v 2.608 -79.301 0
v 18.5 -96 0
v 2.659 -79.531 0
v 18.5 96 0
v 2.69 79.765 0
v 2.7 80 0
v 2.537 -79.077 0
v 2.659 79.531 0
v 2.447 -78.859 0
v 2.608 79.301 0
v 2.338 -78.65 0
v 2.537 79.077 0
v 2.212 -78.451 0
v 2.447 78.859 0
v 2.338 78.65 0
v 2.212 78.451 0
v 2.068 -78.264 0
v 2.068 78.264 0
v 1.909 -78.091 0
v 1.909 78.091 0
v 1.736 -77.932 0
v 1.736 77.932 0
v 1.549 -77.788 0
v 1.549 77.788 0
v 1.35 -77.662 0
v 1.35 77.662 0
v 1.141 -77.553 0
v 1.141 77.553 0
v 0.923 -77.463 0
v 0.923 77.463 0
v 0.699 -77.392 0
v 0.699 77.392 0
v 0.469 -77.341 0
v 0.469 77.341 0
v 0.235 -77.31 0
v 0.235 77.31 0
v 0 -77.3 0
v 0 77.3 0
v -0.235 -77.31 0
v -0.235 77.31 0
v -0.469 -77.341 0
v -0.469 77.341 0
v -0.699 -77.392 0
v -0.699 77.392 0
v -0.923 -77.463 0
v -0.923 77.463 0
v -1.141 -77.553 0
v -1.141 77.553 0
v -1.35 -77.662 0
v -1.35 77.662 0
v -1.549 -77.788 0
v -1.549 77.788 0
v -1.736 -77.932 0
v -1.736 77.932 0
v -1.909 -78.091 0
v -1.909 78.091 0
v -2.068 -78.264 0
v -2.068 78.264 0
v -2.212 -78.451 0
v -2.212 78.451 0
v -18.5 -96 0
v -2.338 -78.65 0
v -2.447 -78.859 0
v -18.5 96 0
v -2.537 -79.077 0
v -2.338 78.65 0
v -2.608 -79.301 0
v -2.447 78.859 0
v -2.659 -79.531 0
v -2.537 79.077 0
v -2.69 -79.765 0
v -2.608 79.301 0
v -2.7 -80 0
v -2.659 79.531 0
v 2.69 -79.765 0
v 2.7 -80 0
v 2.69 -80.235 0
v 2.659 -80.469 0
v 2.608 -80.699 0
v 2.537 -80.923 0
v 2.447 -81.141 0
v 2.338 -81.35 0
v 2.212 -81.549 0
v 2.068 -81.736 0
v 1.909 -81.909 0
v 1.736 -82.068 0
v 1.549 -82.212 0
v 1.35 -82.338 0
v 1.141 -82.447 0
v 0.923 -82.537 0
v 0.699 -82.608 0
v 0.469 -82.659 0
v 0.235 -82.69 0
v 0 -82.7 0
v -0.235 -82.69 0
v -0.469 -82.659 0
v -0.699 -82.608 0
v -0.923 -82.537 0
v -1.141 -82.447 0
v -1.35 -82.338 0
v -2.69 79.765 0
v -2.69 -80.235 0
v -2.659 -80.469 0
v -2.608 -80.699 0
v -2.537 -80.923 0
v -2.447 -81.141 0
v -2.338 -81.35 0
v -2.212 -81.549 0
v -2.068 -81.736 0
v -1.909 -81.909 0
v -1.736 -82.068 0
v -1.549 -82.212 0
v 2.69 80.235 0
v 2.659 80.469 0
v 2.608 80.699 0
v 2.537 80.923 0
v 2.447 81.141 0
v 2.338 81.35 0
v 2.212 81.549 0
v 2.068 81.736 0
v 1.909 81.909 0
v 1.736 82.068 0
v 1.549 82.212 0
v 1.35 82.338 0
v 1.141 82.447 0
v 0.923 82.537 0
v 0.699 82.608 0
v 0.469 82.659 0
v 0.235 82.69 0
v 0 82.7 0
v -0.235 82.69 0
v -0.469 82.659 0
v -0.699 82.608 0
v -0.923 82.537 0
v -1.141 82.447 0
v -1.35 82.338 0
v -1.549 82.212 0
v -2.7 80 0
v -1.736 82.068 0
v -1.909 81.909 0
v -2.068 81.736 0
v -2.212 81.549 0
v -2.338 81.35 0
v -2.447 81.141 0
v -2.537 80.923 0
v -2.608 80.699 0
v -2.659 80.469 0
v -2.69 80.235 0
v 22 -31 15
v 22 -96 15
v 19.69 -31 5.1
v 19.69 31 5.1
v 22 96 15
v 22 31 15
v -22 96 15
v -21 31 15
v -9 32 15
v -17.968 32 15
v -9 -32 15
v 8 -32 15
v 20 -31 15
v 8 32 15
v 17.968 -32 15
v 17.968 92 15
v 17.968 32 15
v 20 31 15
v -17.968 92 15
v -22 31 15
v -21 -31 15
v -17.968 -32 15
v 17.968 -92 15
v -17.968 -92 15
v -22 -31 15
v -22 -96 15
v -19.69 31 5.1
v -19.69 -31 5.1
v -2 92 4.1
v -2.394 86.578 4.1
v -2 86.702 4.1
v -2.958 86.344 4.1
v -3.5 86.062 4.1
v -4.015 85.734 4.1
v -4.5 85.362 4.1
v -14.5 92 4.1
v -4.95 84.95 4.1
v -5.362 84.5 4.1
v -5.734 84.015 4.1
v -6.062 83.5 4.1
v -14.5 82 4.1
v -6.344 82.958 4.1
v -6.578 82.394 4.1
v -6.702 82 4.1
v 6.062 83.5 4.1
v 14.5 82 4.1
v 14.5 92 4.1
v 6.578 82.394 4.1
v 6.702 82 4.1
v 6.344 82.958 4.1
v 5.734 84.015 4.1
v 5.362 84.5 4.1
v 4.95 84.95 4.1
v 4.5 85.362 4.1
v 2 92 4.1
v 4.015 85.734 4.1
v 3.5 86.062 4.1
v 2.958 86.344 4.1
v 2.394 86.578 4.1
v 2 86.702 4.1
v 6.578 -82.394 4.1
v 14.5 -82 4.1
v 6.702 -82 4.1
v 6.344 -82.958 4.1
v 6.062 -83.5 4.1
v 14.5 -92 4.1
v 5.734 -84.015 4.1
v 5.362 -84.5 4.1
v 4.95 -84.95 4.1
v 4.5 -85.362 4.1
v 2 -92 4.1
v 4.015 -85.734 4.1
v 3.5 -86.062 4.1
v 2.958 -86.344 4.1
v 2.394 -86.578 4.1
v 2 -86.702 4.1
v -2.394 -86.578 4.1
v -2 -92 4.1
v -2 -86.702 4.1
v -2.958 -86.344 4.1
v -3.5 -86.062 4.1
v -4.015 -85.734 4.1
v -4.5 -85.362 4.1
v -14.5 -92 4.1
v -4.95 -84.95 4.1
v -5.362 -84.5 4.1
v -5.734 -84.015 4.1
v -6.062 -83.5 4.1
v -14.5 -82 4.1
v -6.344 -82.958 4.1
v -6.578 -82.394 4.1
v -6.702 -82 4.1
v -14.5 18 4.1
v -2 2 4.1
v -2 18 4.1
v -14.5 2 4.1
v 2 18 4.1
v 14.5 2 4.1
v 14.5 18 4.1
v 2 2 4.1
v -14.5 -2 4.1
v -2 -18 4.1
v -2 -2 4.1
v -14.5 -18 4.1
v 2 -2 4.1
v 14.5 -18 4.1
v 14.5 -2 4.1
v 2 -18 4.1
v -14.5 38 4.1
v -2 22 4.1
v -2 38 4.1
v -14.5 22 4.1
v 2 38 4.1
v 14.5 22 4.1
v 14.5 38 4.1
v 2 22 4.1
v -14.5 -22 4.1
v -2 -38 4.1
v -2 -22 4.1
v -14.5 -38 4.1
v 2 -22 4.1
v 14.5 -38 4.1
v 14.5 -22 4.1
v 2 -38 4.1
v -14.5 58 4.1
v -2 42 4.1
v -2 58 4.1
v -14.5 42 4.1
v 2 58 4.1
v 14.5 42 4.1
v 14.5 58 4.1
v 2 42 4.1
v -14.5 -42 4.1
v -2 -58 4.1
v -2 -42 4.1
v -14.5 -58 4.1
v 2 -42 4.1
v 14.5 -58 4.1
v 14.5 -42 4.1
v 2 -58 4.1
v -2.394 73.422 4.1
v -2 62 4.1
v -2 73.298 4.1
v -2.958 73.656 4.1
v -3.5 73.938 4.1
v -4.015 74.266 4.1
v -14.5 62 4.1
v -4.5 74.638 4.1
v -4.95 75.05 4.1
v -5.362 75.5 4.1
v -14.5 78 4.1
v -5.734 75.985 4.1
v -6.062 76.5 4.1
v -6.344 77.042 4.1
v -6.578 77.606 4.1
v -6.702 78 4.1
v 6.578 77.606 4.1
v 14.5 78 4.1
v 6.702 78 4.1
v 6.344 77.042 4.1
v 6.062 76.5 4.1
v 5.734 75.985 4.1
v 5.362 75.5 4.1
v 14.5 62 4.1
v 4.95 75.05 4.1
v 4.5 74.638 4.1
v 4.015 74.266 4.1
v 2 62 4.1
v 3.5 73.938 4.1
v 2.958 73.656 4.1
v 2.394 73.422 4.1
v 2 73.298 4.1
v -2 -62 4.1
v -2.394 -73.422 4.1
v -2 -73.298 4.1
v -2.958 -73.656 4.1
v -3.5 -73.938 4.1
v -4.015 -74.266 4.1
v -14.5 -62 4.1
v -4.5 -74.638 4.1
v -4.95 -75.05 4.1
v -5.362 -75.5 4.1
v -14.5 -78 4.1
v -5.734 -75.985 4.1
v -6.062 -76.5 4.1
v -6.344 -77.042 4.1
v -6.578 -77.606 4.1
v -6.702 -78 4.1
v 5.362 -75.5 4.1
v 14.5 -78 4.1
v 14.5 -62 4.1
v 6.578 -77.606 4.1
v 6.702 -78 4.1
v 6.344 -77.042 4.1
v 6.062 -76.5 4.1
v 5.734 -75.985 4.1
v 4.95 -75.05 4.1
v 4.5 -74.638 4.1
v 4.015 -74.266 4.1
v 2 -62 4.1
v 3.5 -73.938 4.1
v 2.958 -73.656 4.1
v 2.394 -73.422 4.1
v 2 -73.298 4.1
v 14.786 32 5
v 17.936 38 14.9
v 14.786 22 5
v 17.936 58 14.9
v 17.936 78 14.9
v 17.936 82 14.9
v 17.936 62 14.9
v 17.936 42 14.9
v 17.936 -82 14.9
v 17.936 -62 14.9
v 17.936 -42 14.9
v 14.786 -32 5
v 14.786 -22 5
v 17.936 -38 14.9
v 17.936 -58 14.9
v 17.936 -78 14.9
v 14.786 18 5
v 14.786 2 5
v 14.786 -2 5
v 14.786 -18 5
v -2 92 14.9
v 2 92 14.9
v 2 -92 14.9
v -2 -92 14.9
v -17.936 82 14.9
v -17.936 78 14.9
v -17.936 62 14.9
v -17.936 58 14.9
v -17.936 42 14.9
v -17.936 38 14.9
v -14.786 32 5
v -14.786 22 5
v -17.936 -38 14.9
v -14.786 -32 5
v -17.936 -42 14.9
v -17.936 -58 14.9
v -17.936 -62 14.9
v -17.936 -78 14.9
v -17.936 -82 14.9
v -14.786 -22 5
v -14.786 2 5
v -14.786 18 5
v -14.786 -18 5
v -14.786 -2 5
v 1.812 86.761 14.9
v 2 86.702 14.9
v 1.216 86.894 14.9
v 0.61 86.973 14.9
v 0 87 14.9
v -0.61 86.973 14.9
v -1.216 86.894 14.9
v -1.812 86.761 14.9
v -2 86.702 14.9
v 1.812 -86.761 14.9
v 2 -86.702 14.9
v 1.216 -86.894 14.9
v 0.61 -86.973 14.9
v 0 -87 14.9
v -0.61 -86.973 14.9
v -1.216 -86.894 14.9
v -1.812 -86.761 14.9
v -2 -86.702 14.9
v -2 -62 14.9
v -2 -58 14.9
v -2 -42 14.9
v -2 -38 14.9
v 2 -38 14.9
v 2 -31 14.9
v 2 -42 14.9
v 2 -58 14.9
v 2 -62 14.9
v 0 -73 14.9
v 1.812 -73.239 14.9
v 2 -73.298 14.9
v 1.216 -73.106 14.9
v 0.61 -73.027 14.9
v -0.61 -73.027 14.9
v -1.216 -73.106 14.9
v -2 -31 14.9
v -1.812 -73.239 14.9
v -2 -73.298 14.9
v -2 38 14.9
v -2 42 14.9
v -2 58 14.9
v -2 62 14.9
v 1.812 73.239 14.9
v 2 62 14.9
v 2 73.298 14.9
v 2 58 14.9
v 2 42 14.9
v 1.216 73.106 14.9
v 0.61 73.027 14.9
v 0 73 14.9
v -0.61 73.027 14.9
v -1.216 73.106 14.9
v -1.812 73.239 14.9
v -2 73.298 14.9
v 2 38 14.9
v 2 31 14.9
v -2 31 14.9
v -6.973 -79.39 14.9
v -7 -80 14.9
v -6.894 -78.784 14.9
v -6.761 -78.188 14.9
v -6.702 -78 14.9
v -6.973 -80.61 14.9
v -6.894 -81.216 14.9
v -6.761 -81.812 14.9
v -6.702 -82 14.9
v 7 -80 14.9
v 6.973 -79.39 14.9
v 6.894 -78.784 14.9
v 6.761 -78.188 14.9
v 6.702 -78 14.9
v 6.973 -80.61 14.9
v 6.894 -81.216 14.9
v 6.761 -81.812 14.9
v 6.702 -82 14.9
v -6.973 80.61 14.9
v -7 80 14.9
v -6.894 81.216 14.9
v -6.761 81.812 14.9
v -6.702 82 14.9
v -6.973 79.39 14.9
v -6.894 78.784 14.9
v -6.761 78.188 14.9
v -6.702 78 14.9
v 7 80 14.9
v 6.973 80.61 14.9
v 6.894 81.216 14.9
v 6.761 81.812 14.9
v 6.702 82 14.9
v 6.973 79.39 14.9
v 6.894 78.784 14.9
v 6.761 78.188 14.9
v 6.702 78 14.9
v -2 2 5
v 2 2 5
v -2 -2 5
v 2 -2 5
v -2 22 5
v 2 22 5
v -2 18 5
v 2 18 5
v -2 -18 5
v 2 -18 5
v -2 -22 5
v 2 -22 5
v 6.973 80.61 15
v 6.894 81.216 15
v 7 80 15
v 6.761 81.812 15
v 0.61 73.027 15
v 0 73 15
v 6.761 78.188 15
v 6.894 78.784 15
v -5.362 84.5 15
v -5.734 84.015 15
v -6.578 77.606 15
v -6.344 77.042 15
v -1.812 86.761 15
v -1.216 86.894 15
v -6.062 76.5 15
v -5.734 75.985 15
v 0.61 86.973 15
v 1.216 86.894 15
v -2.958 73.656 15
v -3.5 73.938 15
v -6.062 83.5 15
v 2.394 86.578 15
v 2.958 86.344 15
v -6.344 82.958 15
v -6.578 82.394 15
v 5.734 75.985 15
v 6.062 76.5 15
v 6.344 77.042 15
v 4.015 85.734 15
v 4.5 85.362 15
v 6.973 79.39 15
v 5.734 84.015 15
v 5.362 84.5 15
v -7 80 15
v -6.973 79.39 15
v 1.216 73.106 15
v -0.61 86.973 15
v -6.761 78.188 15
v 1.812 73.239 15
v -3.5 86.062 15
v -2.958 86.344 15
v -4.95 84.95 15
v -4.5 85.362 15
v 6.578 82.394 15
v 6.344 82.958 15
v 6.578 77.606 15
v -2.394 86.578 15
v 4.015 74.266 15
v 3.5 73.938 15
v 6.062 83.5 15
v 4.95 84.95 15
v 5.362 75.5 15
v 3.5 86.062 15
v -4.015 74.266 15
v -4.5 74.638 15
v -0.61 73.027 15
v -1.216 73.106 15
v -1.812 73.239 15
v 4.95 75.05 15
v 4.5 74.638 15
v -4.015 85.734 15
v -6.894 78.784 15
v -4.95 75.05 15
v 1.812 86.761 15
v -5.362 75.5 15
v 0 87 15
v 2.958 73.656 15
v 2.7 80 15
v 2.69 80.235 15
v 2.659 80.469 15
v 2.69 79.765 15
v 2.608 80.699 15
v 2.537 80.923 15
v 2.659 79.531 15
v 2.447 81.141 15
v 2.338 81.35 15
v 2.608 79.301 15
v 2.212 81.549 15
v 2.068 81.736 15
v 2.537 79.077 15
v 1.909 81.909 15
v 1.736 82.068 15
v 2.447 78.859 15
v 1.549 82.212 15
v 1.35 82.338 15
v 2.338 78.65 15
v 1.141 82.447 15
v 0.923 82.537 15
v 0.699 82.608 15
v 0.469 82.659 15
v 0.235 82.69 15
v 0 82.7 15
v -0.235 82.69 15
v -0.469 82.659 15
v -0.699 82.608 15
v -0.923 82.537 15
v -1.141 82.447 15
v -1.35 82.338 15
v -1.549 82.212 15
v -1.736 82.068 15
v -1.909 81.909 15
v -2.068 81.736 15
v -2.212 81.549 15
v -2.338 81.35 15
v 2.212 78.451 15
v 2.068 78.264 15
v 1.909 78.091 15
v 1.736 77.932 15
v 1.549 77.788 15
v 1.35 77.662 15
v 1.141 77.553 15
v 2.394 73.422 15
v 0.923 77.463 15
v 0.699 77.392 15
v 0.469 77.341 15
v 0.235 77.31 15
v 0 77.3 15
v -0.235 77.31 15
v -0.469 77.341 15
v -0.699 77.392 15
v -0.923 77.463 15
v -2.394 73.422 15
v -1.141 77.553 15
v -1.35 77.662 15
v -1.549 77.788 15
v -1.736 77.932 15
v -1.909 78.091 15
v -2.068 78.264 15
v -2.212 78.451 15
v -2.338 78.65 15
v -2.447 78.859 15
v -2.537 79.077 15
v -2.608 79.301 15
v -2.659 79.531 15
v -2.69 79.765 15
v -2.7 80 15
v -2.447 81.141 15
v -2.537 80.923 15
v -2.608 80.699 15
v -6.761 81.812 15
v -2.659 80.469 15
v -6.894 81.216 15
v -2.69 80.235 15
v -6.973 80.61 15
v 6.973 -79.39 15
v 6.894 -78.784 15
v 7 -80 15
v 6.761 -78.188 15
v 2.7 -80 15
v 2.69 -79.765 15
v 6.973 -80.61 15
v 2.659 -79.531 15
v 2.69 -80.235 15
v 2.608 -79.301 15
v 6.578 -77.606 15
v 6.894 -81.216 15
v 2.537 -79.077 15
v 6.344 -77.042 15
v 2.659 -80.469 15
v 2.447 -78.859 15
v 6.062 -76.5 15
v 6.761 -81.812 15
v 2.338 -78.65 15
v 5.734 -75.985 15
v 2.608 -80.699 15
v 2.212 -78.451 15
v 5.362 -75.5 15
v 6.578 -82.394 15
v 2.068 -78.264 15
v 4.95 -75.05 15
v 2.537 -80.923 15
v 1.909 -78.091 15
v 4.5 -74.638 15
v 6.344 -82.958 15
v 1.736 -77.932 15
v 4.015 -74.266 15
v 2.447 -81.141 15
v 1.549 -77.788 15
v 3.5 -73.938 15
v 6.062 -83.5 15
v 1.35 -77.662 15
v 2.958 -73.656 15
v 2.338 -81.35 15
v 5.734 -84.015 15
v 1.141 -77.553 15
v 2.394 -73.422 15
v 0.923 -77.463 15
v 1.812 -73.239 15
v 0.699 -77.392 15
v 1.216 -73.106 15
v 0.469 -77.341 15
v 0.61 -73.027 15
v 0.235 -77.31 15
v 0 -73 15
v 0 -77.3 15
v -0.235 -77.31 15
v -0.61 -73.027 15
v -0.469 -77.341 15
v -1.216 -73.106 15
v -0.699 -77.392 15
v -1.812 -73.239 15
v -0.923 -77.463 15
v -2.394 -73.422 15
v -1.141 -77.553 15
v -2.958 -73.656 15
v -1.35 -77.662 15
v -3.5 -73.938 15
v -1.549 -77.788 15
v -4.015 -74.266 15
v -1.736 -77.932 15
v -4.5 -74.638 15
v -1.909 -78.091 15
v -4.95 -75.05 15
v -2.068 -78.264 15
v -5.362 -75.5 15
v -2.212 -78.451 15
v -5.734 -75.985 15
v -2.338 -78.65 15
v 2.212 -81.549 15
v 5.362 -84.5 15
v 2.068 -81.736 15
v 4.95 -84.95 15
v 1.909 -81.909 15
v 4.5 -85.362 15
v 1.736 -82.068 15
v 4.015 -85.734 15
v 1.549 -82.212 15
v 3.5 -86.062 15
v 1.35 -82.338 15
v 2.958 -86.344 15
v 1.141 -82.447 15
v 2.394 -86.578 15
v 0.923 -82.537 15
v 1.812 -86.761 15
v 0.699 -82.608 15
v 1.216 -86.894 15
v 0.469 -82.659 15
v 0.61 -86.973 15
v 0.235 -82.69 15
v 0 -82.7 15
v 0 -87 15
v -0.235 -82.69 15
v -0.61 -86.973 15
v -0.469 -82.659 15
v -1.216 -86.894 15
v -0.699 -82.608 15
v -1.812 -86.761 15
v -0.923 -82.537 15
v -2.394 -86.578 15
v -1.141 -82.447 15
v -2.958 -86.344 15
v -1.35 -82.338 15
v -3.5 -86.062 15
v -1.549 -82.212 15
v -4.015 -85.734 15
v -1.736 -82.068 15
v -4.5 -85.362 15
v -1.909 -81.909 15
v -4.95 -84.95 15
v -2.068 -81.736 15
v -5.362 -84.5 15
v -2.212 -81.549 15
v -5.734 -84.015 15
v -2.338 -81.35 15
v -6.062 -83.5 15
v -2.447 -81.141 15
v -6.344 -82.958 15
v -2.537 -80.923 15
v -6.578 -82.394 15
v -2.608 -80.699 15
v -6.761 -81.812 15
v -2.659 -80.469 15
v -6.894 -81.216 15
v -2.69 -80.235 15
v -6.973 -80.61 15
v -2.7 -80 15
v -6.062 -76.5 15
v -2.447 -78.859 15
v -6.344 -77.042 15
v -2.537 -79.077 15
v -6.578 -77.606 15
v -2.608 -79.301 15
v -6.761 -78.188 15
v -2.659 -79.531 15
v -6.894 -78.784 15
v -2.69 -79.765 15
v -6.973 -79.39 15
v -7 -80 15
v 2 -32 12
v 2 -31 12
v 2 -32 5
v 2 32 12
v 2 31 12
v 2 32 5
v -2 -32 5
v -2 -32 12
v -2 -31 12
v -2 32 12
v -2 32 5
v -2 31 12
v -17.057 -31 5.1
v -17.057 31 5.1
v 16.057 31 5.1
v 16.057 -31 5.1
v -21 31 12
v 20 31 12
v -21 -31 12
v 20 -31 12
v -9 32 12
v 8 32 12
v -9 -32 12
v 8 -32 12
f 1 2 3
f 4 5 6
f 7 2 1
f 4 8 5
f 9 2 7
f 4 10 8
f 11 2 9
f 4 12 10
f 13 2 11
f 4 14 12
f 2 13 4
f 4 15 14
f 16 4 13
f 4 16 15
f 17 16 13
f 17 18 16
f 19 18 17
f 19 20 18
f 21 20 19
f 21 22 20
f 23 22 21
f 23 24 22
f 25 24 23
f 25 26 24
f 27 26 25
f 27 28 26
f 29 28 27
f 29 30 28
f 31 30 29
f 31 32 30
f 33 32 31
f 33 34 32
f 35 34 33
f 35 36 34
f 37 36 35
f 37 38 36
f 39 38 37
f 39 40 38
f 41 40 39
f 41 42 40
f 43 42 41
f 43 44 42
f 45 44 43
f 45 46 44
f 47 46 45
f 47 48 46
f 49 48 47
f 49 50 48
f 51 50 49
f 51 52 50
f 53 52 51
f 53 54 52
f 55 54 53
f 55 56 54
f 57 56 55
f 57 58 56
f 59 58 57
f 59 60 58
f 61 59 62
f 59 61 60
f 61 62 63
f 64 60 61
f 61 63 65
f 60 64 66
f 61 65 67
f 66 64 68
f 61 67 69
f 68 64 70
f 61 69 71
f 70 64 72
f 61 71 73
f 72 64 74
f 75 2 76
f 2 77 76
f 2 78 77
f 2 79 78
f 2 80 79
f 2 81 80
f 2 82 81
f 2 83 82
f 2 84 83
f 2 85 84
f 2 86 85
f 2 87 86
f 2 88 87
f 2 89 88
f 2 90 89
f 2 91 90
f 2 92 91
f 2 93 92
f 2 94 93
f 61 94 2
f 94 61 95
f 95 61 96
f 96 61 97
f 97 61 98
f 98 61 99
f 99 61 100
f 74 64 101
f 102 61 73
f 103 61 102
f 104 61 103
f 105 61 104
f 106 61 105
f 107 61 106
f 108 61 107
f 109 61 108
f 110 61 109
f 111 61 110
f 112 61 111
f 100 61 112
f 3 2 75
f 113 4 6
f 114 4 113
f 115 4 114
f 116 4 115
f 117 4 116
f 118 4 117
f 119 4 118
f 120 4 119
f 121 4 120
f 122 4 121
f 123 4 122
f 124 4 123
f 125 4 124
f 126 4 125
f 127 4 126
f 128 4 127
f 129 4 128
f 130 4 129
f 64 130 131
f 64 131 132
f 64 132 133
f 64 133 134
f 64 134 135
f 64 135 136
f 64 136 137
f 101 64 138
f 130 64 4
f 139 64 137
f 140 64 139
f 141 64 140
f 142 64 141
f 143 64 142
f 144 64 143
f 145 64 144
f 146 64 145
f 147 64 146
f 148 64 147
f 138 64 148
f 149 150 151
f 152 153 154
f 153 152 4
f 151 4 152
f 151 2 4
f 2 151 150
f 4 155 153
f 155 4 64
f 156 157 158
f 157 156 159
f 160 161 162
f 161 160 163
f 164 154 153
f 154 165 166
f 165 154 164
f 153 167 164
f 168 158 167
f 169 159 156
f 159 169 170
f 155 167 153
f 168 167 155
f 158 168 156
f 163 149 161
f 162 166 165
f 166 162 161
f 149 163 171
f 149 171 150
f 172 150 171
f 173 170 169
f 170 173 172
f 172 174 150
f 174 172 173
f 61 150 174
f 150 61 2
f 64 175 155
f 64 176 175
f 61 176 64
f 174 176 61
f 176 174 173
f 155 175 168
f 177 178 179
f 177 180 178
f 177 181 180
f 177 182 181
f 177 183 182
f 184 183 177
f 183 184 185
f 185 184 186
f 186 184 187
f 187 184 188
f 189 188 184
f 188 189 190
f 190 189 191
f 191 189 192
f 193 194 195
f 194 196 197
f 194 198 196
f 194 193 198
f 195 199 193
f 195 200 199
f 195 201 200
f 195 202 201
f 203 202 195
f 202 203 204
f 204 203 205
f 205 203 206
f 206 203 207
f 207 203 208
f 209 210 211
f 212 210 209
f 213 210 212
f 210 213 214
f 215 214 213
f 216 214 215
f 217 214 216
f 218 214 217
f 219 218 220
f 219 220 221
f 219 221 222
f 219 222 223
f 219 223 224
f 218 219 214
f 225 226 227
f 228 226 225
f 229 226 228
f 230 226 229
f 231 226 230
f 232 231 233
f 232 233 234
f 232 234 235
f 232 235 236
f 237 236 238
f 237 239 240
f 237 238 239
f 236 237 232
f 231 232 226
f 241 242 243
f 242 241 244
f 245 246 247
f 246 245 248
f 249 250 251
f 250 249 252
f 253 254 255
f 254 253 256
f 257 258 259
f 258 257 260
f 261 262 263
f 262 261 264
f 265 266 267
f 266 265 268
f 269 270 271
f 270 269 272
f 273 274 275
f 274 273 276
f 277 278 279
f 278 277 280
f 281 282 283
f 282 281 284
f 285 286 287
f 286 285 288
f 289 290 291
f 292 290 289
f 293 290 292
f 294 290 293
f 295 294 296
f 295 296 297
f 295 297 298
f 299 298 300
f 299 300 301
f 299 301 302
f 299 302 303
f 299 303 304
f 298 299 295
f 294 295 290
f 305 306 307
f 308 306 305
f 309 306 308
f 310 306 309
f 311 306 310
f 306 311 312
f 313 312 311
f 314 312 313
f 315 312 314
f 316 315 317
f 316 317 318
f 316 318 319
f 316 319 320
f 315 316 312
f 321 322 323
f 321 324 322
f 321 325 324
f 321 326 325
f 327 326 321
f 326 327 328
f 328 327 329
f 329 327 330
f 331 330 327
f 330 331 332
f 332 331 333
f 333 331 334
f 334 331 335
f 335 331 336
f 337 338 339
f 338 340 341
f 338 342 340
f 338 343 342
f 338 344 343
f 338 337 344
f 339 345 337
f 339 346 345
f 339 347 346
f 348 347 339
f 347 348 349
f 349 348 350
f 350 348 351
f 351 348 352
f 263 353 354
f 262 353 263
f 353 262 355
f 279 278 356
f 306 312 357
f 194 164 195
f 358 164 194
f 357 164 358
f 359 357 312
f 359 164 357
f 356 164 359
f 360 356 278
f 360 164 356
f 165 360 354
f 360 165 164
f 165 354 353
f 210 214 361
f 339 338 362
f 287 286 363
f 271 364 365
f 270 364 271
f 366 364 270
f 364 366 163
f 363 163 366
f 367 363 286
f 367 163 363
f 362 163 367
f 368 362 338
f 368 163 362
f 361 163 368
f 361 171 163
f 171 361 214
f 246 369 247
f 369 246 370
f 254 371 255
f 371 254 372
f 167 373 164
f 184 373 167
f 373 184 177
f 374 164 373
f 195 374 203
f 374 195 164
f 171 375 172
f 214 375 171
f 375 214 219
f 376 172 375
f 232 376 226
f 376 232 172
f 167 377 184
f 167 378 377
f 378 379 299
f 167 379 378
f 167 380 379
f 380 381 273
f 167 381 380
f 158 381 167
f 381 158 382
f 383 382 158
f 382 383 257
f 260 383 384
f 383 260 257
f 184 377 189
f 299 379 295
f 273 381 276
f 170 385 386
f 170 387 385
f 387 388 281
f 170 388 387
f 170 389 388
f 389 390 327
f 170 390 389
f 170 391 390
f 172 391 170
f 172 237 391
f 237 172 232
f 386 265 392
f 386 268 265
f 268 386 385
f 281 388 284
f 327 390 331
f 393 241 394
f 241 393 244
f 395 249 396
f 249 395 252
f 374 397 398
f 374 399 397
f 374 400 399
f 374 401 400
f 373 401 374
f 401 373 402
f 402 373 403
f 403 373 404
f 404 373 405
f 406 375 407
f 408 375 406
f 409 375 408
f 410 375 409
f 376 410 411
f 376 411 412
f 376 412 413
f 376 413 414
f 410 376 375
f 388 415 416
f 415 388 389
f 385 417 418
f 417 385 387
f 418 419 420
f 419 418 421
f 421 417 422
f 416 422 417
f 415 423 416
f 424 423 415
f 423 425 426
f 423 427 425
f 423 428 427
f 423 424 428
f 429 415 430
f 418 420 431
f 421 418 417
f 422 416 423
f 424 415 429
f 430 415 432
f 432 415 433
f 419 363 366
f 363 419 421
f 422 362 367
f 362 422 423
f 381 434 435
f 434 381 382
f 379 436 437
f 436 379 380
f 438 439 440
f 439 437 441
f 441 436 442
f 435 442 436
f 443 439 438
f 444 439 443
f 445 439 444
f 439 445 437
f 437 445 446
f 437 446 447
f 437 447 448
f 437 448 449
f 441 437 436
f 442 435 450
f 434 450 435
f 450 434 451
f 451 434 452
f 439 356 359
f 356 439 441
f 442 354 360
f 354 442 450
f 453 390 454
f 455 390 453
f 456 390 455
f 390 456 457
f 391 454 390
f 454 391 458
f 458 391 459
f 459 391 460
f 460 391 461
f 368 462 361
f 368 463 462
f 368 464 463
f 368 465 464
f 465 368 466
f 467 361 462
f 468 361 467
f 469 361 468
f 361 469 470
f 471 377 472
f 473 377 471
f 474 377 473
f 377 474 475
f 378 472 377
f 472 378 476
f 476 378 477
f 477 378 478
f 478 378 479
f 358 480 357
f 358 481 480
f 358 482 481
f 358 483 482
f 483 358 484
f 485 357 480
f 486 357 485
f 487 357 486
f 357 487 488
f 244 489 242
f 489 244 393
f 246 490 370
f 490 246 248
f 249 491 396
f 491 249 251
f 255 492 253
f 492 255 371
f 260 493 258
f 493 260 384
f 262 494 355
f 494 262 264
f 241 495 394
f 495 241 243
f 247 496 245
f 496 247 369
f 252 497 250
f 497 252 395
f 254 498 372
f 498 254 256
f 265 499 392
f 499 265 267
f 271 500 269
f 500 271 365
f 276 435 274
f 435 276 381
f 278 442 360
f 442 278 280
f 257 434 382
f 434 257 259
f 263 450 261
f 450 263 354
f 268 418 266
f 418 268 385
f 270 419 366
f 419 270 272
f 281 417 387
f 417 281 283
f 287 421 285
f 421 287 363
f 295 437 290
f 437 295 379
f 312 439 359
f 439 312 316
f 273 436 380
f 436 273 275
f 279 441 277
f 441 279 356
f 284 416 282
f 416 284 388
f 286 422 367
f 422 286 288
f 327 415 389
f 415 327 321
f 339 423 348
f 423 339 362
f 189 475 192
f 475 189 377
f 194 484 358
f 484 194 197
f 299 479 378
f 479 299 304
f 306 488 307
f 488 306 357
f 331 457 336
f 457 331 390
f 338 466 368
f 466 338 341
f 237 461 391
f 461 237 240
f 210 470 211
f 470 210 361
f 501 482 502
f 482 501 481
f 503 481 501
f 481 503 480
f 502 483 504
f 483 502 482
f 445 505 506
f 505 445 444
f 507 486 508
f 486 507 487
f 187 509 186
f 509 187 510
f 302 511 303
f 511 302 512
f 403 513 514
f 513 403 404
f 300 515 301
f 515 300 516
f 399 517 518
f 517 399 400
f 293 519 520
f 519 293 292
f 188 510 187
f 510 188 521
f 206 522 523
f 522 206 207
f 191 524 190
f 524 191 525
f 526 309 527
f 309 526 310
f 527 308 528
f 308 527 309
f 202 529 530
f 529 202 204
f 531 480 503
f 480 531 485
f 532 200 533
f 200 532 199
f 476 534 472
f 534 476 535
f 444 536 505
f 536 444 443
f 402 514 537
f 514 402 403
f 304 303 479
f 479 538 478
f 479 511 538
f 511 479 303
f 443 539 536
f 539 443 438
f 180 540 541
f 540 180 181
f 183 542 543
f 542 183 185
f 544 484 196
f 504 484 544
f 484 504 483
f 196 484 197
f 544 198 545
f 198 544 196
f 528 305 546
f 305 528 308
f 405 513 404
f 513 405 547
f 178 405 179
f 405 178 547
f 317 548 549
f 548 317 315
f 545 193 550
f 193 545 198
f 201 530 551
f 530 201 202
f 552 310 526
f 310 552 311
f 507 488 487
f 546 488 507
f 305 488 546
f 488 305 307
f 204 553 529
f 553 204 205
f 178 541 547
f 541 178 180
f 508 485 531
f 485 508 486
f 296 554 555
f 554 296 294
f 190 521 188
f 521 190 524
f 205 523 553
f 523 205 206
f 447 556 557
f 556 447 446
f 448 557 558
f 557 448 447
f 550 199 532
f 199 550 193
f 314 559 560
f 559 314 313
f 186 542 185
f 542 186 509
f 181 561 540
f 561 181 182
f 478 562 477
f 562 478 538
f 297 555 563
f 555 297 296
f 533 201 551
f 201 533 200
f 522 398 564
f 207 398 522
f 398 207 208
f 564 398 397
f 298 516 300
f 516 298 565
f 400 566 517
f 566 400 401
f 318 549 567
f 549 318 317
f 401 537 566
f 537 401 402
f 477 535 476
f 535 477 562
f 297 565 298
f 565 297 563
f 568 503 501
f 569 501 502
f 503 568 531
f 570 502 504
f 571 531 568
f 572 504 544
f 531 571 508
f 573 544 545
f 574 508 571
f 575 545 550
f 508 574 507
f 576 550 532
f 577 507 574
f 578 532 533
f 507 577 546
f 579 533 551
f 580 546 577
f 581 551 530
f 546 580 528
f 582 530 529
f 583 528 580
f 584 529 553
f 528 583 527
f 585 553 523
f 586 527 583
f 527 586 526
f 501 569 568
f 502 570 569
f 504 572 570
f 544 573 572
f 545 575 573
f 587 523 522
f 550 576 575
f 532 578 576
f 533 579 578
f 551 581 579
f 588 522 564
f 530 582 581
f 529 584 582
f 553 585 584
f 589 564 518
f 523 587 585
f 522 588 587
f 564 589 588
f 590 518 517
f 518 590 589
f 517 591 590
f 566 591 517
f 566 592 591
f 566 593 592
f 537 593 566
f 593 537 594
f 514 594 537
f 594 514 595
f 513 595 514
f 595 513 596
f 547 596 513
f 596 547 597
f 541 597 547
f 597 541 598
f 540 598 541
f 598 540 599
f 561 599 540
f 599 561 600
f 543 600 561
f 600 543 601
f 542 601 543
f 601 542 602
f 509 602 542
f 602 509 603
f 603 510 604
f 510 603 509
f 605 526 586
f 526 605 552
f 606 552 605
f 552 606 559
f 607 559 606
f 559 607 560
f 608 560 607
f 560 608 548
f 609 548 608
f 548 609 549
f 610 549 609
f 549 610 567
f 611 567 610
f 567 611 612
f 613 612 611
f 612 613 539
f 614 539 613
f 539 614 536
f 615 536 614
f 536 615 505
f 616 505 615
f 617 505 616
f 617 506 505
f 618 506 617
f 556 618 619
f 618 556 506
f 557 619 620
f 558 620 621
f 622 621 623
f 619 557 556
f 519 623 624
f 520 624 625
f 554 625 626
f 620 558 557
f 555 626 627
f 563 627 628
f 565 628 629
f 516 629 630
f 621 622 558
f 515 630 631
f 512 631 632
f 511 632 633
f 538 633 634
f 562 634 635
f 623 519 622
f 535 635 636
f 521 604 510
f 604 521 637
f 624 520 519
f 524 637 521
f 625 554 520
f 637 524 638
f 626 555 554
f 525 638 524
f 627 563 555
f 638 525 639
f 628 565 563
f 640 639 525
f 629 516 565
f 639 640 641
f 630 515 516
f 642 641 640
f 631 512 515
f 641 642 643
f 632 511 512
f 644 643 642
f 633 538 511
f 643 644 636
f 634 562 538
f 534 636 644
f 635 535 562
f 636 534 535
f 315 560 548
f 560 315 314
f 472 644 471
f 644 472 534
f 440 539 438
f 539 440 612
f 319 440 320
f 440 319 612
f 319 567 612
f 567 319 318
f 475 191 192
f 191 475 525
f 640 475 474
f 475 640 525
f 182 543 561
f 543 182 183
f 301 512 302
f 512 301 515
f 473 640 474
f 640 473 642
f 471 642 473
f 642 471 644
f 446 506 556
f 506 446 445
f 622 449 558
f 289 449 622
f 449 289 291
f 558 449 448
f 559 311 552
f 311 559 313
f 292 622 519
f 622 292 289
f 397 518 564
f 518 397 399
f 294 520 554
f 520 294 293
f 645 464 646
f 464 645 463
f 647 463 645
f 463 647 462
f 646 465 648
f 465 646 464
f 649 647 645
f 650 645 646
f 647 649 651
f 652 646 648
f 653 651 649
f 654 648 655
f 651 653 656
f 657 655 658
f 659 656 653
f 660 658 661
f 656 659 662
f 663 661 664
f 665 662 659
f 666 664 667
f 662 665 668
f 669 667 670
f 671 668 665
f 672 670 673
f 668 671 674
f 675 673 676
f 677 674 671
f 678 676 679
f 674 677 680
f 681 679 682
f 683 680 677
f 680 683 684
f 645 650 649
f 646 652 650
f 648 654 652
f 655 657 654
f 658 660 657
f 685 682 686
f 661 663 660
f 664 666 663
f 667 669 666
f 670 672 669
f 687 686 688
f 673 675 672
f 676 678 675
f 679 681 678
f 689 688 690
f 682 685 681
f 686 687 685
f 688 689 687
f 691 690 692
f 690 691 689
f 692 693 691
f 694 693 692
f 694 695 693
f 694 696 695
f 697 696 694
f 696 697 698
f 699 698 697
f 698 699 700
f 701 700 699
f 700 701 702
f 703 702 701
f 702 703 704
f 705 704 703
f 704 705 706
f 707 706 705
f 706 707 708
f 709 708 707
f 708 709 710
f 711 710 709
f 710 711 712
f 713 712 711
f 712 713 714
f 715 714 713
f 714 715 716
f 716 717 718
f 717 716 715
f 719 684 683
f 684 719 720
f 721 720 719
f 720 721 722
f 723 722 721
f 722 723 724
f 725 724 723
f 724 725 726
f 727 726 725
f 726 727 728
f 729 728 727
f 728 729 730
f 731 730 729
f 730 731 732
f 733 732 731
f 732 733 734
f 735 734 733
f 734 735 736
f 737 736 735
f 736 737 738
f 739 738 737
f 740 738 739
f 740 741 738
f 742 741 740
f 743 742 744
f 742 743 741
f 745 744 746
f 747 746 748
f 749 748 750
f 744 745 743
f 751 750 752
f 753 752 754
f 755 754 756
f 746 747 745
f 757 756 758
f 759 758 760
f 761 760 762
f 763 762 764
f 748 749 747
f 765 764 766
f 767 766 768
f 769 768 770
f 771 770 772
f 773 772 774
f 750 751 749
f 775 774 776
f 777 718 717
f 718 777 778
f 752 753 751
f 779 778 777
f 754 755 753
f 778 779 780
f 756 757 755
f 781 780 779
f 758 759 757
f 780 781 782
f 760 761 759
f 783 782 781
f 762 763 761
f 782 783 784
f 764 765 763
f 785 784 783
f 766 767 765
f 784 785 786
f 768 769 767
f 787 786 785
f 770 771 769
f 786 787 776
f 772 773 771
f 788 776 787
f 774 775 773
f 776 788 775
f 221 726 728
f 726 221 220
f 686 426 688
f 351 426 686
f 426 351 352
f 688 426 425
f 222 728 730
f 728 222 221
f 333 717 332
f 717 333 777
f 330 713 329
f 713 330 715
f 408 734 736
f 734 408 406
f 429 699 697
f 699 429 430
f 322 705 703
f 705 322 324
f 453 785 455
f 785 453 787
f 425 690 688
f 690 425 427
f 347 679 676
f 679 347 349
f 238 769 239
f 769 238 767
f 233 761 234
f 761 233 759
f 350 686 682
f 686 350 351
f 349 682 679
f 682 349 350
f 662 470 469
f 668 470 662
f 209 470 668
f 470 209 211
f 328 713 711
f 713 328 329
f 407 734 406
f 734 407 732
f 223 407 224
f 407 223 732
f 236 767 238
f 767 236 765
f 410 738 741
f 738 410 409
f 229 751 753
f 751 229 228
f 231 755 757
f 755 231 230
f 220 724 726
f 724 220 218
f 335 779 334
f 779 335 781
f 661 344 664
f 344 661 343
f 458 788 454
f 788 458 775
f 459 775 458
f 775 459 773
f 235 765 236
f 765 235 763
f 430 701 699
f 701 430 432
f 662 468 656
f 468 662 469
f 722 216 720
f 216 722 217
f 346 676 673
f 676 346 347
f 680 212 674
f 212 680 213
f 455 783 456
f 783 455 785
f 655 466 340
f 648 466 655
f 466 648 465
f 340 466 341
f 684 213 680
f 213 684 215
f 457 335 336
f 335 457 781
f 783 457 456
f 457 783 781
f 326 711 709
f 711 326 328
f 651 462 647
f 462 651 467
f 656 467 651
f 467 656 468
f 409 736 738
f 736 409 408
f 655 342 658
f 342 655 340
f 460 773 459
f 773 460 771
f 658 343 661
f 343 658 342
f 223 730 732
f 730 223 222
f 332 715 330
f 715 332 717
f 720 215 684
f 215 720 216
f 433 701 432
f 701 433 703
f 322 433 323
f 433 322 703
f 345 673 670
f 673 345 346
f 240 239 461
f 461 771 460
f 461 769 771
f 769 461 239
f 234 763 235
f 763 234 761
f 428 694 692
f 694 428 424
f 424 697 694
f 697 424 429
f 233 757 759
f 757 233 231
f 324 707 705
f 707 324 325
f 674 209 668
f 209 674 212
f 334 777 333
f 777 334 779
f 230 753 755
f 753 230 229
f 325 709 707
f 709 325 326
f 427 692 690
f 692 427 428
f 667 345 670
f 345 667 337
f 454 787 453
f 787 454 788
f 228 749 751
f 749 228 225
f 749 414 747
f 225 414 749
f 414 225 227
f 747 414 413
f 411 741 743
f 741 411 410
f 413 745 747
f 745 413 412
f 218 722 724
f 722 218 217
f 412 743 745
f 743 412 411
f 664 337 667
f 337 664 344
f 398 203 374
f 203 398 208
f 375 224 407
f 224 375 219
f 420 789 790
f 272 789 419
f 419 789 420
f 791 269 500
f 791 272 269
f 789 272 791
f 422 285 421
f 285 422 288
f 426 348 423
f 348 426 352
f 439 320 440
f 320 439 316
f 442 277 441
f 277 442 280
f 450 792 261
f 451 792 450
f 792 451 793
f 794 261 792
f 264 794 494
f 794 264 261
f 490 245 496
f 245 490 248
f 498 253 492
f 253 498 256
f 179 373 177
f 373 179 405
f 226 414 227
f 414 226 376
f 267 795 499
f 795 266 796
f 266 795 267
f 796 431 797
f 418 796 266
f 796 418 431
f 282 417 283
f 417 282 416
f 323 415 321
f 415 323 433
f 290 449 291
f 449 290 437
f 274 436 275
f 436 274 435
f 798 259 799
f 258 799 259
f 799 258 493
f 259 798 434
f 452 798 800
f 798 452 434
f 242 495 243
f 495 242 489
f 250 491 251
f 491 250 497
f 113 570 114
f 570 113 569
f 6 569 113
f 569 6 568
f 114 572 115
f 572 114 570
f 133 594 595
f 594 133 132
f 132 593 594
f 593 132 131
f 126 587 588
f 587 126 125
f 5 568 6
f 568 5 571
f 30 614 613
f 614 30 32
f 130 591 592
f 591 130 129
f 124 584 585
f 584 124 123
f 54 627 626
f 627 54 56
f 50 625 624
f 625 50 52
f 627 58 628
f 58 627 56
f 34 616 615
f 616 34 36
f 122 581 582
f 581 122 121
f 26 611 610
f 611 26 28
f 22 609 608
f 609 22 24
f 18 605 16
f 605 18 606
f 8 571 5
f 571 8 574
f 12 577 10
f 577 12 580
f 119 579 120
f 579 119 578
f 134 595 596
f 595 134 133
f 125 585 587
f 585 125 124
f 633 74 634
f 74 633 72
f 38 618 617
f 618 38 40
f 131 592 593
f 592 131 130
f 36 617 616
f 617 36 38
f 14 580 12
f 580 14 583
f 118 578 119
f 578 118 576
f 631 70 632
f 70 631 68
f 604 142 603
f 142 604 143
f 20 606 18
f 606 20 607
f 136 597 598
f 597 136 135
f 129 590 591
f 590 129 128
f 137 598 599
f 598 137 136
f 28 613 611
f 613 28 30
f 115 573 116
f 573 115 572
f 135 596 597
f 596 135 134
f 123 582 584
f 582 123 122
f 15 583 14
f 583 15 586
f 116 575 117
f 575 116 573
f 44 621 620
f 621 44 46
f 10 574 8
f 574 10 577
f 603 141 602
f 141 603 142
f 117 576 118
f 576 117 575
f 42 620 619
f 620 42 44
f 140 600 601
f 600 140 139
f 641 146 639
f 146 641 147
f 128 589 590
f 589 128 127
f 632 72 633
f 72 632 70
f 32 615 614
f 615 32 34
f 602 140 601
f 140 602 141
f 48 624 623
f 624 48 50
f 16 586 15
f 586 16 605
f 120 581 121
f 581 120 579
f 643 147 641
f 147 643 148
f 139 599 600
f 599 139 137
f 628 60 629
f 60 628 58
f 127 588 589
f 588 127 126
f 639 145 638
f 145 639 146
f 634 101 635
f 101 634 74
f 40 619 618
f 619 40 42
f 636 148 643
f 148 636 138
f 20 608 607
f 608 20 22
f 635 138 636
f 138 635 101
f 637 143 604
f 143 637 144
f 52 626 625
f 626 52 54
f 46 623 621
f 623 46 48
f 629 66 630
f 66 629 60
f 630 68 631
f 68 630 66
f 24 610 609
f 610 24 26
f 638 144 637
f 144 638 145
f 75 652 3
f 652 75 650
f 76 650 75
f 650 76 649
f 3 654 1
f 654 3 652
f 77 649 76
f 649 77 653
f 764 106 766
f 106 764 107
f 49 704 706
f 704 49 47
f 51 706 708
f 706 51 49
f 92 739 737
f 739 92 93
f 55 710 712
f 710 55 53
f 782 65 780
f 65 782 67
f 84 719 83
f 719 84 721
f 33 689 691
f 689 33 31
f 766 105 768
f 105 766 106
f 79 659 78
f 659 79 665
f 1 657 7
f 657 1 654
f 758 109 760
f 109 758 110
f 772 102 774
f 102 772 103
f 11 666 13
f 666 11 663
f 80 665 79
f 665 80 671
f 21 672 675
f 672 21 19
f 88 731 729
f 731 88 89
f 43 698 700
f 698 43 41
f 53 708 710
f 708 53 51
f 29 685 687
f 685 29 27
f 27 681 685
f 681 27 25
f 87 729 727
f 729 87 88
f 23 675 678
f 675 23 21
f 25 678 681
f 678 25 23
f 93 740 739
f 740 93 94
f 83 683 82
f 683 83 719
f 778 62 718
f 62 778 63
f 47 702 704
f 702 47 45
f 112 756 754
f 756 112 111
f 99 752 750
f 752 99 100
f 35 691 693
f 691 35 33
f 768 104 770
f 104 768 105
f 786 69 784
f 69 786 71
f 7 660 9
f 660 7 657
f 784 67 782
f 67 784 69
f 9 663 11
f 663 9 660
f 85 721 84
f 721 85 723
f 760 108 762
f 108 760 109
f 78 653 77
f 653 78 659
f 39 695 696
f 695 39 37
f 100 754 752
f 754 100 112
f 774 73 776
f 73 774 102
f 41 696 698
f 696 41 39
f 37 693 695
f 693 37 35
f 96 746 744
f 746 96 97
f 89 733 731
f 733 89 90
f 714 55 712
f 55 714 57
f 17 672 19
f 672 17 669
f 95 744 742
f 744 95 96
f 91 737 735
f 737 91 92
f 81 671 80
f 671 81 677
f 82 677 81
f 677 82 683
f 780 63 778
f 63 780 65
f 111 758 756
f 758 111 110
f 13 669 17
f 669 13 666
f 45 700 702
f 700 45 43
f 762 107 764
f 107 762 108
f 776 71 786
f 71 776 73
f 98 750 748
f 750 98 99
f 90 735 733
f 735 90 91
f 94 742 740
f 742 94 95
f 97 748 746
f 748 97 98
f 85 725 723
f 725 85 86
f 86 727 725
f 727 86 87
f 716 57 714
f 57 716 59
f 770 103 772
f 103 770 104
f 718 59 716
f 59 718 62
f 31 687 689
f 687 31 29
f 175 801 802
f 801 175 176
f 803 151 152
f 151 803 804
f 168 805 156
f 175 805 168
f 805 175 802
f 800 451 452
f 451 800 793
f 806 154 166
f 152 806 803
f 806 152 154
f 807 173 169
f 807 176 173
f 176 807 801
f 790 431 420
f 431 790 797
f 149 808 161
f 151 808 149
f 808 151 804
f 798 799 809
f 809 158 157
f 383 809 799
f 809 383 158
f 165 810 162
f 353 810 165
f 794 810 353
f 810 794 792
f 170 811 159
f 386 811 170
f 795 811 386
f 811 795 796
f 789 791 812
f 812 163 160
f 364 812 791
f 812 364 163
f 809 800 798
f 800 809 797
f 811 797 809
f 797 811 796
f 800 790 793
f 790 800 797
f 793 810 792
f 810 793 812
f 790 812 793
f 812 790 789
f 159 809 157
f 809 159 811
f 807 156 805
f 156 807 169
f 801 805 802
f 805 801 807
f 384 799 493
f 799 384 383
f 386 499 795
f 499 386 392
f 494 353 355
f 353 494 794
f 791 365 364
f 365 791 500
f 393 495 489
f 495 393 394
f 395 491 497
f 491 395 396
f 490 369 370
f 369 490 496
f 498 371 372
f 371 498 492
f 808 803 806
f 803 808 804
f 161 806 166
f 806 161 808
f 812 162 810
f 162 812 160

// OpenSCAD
// QUEUE D'ARONDE VIXEN 162 mm & 192mm
// Pierre REVEL 24/3/24
//
// Projet lunette PVC 60 mm DIY
// Queue d'aronde au format VIXEN 162mm (possibilité 192 mm) spécifiquement conçue pour
// les colliers pour tubes diamètre 63 et leurs vis de fixation murale

$fn=72;
aju=0.1;

ep=4;
trouvis=5.4; // diamètre trou des vis des colliers 

// 0 pour version 192mm, 30 pour version 162mm (réduite de 30mm)
reduc=0;
// le nombre de murs de renfort dans la largeur dépend de la version
wall_extent = reduc > 0 ? 100 : 80;  

// 0 = Vixen-only, 1 = Vixen + Ulanzi Ombra Video & Manfrotto photo tripods
multi_standard = 1;

module matiere() {
    union() {
      difference() {
        // extérieur de la coque
        translate([-22,0,0]) rotate([90,0,0])
            linear_extrude(height=192-reduc,center=true) polygon(points=[[3.5,0],[0,15],[44,15],[40.5,0]]);
        // intérieur de la coque
        translate([-22,0,aju]) rotate([90,0,0])
            linear_extrude(height=192-reduc-2*ep,center=true) polygon(points=[[3.5+ep,ep],[ep,15],[44-ep,15],[40.5-ep,ep]]);
      }
      // renforts pour les vis des colliers
      translate([0,80-reduc*2/3,0]) cylinder(h=15,r=ep+3);
      translate([0,-80+reduc*2/3,0]) cylinder(h=15,r=ep+3);

      // murs de renfort dans la largeur  
      dz=ep/2+7.5-aju;
      for (y=[0:20:wall_extent-reduc]) {
        translate([0,y,dz]) cube([44-2*ep,ep,15-ep],center=true);
        if (y!=0) translate([0,-y,dz]) cube([44-2*ep,ep,15-ep],center=true);
      }
      // mur de renfort dans la longueur  
      translate([0,0,dz]) cube([ep,192-reduc-aju,15-ep],center=true);
    }
}

module queue_aronde_ulanzi_ombra_video(length = 70, shrink = 0) {
    // set "shrink" to 1(mm) for Manfrotto compatibility, or 0 for original model

    width  = 41-shrink;
    height = 10;

    translate([-20, length/2, 0]) 
        rotate([90,0,0]) 
            linear_extrude(length) {
                polygon([[0,0],[12,0],[12,3],[width-12,3],[width-12,0],[width,0],[width,3],[width-4,height],[4,height],[0,3]]);
            }
}


union() {
    difference() {
      matiere();
      // TROUS DE DIAMETRE <trouvis>
      translate([0,80-reduc*2/3,-10]) cylinder(h=35,r=trouvis/2);
      translate([0,-80+reduc*2/3,-10]) cylinder(h=35,r=trouvis/2);
      if(multi_standard) {
          //translate([0,0,10+aju]) cube([20,76,10], center=true);
          translate([0,0,10+aju]) cube([100,62,10], center=true);
      }
    }
    if(multi_standard) translate([0,0,15]) rotate([0,180,0]) queue_aronde_ulanzi_ombra_video(length = 64, shrink = 0);
}
